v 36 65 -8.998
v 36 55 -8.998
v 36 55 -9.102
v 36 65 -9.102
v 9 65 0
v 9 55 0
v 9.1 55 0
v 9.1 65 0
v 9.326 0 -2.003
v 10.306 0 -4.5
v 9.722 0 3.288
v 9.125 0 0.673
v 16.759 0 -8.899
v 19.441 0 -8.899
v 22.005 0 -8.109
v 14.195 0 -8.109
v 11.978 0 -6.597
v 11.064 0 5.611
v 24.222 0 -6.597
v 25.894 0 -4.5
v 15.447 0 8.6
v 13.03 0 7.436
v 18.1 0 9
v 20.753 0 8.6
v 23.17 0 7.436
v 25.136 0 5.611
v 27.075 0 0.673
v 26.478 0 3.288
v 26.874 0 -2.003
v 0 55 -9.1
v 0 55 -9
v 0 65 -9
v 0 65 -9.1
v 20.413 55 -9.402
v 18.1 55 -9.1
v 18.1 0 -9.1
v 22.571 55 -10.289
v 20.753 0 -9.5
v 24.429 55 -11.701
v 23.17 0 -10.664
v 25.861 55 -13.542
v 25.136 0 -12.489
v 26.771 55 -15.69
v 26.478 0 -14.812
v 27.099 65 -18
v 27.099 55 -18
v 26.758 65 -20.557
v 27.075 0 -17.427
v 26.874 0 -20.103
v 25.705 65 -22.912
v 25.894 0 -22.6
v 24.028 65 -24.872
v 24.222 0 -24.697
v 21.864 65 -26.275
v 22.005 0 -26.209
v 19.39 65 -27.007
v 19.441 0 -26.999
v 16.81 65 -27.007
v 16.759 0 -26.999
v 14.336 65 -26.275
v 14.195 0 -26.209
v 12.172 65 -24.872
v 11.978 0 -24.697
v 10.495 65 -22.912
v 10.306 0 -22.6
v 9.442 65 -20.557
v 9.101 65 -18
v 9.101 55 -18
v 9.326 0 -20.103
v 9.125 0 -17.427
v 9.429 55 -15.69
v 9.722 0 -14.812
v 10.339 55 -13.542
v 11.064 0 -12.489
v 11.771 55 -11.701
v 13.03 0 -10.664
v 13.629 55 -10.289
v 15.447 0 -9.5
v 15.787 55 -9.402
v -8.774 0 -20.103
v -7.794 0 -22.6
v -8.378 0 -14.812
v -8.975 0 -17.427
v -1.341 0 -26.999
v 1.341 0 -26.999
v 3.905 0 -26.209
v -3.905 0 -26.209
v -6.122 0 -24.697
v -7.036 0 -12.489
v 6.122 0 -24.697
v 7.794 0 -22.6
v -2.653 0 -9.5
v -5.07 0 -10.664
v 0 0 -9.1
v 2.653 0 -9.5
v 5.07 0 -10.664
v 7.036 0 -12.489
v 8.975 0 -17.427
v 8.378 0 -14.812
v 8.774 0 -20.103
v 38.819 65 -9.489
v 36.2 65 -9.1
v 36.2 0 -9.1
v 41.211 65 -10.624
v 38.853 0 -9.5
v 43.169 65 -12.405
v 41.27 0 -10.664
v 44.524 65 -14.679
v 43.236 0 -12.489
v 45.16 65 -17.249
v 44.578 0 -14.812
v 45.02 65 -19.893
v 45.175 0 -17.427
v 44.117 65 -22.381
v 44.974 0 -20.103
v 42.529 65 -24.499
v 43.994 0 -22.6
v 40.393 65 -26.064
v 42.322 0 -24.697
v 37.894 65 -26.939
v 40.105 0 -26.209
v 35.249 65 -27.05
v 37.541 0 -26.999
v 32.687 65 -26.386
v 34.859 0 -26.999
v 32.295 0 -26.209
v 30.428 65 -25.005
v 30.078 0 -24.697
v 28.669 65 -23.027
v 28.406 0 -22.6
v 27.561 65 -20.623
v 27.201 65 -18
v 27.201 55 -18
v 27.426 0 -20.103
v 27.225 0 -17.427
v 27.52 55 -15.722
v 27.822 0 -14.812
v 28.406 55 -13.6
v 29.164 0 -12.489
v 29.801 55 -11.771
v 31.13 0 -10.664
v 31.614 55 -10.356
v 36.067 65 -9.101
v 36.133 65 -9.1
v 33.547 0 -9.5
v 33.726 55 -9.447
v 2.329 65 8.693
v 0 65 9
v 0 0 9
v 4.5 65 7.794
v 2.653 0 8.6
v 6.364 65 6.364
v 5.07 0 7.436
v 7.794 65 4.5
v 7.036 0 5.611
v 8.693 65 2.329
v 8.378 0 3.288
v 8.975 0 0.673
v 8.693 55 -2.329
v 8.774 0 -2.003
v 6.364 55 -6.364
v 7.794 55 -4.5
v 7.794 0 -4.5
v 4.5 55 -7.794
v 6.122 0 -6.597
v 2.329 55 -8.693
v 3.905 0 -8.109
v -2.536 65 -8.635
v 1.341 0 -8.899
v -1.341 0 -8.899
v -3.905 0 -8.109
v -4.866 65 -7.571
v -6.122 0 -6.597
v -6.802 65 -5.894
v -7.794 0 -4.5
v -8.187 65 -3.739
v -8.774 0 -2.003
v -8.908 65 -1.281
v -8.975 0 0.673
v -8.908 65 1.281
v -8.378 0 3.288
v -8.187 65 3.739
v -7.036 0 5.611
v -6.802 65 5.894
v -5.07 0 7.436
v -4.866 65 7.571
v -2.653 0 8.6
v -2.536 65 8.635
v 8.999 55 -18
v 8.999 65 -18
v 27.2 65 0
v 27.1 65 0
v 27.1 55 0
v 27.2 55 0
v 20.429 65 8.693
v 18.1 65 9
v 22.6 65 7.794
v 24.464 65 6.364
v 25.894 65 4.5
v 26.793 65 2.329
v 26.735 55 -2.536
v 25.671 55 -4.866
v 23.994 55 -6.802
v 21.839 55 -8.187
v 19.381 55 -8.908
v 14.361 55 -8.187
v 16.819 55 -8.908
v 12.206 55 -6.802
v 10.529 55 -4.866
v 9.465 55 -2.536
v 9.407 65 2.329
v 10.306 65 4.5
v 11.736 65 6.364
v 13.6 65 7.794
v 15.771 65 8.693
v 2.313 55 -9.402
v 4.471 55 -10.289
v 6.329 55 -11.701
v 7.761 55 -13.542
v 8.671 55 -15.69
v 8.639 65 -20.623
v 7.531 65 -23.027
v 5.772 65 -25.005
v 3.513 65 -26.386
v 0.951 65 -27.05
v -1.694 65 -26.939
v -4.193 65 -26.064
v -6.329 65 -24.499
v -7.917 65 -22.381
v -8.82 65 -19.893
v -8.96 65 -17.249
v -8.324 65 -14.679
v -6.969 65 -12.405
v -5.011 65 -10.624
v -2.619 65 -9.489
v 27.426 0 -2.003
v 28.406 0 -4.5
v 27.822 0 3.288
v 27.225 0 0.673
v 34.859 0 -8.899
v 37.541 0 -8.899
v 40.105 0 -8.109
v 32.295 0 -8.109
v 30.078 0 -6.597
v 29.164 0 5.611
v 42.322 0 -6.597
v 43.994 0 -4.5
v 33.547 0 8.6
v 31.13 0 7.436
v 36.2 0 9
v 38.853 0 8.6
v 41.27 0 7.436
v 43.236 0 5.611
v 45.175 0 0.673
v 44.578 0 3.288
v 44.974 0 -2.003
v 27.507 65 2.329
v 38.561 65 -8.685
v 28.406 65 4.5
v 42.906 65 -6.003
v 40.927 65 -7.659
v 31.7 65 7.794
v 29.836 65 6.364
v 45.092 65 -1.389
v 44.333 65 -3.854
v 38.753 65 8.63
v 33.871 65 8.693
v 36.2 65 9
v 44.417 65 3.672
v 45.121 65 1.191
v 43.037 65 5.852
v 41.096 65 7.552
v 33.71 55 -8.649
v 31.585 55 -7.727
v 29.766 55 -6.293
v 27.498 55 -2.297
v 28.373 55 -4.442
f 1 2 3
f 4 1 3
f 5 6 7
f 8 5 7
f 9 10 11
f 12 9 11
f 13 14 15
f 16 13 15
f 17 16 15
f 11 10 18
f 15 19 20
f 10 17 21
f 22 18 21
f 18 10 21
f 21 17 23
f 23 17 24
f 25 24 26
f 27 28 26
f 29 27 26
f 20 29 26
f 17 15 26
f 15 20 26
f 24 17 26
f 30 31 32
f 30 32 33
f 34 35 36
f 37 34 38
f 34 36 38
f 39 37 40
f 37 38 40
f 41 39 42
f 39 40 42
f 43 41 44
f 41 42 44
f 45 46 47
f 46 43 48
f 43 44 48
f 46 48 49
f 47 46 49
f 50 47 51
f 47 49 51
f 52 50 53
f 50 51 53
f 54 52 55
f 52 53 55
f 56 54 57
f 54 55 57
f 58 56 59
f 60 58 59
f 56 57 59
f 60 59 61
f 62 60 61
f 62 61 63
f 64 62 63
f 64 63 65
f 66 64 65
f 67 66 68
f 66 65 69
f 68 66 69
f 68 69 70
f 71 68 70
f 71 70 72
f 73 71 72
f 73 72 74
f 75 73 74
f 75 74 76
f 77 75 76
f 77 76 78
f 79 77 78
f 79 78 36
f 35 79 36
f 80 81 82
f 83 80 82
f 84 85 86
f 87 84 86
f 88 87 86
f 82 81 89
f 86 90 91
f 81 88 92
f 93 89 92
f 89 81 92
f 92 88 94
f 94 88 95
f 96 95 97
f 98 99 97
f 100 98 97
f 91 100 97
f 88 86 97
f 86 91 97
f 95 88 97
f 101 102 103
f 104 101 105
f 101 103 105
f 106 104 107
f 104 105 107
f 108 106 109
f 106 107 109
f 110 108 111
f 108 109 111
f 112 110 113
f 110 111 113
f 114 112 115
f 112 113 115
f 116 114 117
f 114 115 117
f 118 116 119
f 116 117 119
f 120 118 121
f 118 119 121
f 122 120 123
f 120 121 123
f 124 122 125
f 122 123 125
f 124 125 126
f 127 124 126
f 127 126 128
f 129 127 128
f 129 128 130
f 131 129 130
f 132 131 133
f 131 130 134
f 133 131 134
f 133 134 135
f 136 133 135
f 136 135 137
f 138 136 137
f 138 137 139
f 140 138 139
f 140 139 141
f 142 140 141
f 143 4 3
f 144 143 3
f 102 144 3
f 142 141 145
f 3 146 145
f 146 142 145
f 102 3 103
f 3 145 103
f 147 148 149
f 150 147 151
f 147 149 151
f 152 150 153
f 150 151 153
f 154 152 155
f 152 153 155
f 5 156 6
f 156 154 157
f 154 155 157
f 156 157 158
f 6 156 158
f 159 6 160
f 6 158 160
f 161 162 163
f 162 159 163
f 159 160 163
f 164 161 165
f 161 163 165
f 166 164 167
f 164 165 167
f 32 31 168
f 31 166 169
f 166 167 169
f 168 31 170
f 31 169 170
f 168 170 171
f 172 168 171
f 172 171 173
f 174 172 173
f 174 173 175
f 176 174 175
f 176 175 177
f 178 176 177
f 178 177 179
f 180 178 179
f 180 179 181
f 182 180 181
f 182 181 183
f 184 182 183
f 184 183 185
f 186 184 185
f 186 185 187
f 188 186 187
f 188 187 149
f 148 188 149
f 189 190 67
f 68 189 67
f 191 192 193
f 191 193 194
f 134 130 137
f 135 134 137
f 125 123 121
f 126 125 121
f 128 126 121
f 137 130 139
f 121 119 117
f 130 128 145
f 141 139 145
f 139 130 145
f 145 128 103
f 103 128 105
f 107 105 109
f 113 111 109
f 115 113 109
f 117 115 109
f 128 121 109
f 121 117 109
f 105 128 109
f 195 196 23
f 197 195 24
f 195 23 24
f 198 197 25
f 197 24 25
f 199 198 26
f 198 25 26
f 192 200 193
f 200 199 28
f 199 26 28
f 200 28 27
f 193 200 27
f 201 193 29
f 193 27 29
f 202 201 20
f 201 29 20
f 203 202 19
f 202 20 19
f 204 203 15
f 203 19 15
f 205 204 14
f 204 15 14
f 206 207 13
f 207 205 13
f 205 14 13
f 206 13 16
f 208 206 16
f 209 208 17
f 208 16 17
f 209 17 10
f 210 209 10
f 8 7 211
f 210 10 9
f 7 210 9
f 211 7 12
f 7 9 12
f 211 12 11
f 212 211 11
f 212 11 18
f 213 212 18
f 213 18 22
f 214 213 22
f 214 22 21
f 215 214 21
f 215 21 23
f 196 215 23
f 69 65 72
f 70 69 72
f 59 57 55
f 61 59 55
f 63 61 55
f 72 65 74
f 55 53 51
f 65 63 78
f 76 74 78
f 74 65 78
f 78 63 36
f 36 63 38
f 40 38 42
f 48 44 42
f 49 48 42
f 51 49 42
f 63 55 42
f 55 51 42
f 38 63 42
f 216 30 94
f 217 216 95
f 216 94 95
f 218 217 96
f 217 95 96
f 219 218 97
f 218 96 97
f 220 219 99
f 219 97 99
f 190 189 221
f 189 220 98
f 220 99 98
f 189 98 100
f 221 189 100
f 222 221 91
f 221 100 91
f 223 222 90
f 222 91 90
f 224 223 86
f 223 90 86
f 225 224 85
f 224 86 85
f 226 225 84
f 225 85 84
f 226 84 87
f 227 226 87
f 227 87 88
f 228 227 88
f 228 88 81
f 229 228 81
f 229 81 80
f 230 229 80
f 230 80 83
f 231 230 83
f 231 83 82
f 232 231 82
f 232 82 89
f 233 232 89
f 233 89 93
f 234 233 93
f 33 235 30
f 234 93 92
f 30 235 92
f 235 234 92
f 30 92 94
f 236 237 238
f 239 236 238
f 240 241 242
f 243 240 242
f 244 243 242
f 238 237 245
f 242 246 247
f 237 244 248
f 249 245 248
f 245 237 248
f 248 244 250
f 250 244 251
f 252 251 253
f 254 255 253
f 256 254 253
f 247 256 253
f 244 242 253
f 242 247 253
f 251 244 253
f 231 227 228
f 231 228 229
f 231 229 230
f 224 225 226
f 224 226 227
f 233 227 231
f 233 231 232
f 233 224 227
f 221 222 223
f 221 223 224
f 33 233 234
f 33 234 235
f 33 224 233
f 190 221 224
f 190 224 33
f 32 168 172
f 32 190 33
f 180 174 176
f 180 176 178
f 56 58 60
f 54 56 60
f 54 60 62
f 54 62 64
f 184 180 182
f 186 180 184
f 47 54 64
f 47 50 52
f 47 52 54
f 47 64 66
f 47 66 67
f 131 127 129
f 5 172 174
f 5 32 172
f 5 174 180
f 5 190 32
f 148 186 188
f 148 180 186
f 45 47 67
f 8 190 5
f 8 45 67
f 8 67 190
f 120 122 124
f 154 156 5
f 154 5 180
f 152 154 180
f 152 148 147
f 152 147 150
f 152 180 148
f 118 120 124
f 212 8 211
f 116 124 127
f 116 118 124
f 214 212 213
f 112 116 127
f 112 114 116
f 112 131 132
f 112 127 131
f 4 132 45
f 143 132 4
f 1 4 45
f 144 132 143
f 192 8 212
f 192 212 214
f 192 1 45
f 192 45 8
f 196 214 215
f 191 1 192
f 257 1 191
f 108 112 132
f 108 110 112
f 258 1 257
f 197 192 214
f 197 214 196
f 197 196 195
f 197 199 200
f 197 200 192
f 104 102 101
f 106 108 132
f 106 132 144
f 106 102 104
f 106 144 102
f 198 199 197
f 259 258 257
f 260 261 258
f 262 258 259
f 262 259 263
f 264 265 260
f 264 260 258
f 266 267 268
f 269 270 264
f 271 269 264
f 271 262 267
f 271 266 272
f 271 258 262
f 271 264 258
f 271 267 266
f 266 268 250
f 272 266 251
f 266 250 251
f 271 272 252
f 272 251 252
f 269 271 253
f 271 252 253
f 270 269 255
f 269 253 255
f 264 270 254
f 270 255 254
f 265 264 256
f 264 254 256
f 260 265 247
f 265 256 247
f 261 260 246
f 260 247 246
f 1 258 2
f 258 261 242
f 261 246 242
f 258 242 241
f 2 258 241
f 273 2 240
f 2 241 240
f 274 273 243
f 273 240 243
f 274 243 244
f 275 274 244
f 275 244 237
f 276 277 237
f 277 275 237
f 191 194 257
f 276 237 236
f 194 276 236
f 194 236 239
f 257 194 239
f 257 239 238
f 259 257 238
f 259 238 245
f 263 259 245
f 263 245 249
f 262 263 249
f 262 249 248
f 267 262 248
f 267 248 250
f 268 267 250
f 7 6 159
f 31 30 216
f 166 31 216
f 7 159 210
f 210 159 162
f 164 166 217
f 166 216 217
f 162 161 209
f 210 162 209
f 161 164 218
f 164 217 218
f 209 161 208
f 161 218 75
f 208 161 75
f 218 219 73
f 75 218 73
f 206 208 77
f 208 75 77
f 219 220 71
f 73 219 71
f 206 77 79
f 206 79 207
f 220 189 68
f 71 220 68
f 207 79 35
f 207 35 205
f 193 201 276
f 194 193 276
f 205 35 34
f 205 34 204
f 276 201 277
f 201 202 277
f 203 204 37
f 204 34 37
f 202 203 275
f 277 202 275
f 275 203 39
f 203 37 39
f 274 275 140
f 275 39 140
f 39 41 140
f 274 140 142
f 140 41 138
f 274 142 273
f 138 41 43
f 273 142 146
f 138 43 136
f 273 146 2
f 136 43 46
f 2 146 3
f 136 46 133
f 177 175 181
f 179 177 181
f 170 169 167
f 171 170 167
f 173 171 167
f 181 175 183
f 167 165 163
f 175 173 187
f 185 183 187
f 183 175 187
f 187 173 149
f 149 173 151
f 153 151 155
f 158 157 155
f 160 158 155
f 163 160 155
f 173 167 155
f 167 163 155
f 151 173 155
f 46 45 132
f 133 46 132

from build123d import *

# Parameters (mm, degrees)
CROQUIS1_R              = 9
SALIENTE_EXTRUIR1_DEPTH = 65
CROQUIS2_W              = 36
CROQUIS2_H              = 18
SALIENTE_EXTRUIR2_DEPTH = 10
MATRIZL1_COUNT          = 3
MATRIZL1_PITCH          = 18.1
MATRIZL1_COUNT_DIR2     = 2
MATRIZL1_PITCH_DIR2     = 18.1


with BuildPart() as part:
    # Croquis1 → Saliente-Extruir1 (new body)
    with BuildSketch(Plane(origin=(0, 0, 0), x_dir=(1, 0, 0), z_dir=(0, 1, 0))):
        with Locations(Location((0, 0, 0), (0, 0, 270))):
            Circle(CROQUIS1_R)
    saliente_extruir1 = extrude(amount=SALIENTE_EXTRUIR1_DEPTH)

    # Croquis2 → Saliente-Extruir2 (add)
    with BuildSketch(Plane(origin=(0, 65, 0), x_dir=(1, 0, 0), z_dir=(0, 1, 0))):
        with Locations((18, 9)):
            Rectangle(CROQUIS2_W, CROQUIS2_H)
    extrude(amount=-SALIENTE_EXTRUIR2_DEPTH)

    # MatrizL1: Saliente-Extruir1 3 × 2
    with Locations(*[(i * MATRIZL1_PITCH, 0, -j * MATRIZL1_PITCH_DIR2) for i in range(MATRIZL1_COUNT) for j in range(MATRIZL1_COUNT_DIR2) if (i, j) != (0, 0)]):
        add(saliente_extruir1)


solid = part.part
